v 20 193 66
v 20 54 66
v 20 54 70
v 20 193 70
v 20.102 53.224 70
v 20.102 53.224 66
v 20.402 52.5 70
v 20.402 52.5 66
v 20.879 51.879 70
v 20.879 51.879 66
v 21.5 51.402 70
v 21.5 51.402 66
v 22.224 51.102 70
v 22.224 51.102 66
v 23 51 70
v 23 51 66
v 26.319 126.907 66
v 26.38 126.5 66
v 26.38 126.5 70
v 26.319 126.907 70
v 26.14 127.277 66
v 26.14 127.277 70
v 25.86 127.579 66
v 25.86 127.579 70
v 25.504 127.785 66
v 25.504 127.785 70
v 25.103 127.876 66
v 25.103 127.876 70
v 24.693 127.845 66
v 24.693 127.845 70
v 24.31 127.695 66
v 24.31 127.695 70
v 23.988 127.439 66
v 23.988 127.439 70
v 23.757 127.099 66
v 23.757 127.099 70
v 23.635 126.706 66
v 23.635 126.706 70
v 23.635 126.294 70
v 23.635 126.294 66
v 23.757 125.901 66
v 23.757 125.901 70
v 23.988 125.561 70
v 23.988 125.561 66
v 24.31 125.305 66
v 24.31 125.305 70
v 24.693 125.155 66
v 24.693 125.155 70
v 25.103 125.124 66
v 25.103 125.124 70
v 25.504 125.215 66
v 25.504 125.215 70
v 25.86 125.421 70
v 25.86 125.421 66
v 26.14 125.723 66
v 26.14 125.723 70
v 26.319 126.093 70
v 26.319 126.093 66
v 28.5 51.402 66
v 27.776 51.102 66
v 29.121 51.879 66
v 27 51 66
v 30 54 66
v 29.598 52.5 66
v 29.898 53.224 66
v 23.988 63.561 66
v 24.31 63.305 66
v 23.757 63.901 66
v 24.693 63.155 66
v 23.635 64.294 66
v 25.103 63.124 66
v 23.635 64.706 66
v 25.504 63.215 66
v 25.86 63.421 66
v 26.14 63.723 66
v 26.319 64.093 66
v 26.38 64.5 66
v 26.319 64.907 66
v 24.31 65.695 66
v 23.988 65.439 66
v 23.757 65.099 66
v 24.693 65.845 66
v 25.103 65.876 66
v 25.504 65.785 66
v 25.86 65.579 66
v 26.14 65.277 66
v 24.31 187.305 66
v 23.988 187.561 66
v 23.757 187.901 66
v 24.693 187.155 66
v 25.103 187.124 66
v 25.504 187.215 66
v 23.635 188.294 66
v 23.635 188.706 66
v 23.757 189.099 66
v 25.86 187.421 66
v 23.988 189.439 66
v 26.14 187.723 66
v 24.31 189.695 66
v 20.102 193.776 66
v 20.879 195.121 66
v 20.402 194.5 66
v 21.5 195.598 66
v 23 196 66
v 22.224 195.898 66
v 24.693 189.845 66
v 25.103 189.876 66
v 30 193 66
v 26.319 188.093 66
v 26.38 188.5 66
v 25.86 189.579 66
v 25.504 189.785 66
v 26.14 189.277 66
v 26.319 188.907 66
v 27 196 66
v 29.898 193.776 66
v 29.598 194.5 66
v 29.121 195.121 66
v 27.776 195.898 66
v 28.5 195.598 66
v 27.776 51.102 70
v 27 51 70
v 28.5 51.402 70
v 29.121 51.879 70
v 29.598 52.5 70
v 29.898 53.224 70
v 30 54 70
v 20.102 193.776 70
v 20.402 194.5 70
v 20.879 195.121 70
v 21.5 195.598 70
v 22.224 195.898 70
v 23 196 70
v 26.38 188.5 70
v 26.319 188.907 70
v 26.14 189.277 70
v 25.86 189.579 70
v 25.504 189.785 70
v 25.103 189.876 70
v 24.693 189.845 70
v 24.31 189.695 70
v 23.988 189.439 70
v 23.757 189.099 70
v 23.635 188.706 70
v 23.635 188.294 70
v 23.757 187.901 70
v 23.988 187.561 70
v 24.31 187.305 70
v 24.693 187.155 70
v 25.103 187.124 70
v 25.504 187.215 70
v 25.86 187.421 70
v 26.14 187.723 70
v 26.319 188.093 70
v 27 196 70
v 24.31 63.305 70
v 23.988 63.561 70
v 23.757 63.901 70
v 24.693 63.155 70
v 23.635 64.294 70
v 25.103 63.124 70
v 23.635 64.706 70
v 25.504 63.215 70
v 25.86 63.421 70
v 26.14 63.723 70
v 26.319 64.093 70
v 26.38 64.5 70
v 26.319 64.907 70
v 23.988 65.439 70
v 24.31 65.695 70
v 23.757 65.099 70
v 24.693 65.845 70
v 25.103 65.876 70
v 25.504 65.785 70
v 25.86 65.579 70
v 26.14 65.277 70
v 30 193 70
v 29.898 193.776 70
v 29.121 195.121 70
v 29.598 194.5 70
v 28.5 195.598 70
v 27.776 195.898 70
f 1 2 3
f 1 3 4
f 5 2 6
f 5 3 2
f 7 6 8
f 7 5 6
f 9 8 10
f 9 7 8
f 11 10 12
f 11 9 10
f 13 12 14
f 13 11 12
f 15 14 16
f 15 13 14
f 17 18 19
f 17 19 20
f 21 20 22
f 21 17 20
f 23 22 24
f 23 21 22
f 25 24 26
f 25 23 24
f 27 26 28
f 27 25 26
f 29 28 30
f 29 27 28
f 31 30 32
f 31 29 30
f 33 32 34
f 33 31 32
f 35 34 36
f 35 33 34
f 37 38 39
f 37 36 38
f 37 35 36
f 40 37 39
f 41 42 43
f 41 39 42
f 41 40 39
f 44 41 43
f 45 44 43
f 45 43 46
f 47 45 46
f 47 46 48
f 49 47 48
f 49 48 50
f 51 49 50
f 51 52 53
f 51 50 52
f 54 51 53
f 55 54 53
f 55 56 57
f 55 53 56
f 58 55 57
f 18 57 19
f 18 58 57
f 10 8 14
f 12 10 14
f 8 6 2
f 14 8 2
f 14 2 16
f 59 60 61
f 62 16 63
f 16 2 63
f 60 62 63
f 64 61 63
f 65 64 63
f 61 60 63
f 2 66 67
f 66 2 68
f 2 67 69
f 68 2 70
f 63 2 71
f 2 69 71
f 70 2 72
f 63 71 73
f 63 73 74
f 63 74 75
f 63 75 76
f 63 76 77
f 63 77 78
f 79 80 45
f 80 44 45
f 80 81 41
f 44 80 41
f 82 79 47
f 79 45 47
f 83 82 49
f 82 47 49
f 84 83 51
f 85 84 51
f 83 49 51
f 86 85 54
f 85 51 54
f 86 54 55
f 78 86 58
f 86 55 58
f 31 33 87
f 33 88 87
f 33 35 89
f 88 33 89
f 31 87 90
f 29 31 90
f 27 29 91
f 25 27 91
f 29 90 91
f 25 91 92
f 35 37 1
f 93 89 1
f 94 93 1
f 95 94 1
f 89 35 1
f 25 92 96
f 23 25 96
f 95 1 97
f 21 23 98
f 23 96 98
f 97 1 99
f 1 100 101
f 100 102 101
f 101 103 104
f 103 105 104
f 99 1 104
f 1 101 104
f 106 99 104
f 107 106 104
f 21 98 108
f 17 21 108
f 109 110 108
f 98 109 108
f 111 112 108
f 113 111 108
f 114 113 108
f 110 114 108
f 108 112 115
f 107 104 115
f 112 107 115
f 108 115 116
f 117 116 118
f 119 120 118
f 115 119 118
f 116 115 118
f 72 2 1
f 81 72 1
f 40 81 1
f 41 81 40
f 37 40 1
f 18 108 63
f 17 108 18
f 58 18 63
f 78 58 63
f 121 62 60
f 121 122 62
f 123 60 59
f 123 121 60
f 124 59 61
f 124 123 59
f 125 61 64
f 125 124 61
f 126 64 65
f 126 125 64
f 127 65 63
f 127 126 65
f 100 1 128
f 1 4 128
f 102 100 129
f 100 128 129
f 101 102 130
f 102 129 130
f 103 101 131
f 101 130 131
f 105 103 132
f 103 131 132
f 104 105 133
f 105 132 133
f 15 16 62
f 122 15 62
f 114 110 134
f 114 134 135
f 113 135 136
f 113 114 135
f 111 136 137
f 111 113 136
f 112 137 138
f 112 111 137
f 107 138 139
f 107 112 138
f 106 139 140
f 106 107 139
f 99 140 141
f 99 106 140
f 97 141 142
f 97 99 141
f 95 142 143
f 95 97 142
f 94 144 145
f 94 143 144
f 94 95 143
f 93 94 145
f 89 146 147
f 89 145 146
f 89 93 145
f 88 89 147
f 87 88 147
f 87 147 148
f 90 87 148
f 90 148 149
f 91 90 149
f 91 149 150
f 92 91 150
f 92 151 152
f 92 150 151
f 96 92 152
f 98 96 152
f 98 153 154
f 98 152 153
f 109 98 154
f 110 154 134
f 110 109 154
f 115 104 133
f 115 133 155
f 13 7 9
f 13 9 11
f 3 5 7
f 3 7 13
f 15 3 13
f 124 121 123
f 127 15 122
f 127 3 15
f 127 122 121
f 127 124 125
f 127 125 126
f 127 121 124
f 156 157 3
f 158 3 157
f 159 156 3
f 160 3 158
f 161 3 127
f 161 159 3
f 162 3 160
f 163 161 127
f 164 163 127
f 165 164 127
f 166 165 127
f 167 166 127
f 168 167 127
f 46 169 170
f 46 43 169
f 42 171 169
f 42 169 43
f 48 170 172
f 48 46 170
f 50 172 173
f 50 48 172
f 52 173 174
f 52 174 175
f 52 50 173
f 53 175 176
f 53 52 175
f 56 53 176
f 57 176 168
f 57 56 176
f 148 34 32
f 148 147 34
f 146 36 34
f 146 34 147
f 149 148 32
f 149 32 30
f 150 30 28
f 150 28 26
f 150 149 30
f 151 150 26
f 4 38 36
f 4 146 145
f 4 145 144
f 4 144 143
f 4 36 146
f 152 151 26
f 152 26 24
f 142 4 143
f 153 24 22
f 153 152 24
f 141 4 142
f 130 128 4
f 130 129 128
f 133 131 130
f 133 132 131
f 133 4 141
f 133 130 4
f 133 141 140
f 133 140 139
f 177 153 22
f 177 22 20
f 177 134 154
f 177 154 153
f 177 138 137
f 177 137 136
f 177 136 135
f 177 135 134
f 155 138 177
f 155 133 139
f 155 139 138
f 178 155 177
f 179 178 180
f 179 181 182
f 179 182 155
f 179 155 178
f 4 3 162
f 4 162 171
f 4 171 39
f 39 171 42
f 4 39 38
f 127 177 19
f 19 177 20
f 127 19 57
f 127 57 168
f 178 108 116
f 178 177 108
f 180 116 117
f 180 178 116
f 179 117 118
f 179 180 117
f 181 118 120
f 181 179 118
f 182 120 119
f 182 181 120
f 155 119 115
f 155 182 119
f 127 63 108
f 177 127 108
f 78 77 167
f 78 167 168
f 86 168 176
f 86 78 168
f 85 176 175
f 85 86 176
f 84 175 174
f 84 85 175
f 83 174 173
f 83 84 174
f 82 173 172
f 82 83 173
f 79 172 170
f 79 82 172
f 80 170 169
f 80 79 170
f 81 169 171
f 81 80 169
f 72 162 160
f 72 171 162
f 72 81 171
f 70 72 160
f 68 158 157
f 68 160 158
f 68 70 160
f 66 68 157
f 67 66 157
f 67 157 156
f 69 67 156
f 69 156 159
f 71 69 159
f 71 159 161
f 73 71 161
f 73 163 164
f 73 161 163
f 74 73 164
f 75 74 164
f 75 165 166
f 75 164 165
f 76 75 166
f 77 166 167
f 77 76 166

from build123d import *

# Parameters (mm, degrees)
CYLINDER077_R     = 1.38
CYLINDER077_DEPTH = 13
CYLINDER076_R     = 1.38
CYLINDER076_DEPTH = 13
CYLINDER075_R     = 1.38
CYLINDER075_DEPTH = 13
BOX042_W          = 10
BOX042_H          = 145
BOX042_DEPTH      = 4
FILLET009_R       = 3


with BuildPart() as cylinder077:
    # Cylinder077 → Cylinder077 (new body)
    with BuildSketch(Plane(origin=(25, 188.5, 59), x_dir=(1, 0, 0), z_dir=(0, 0, 1))):
        Circle(CYLINDER077_R)
    extrude(amount=CYLINDER077_DEPTH)


with BuildPart() as cylinder076:
    # Cylinder076 → Cylinder076 (new body)
    with BuildSketch(Plane(origin=(25, 126.5, 59), x_dir=(1, 0, 0), z_dir=(0, 0, 1))):
        Circle(CYLINDER076_R)
    extrude(amount=CYLINDER076_DEPTH)


with BuildPart() as cylinder075:
    # Cylinder075 → Cylinder075 (new body)
    with BuildSketch(Plane(origin=(25, 64.5, 59), x_dir=(1, 0, 0), z_dir=(0, 0, 1))):
        Circle(CYLINDER075_R)
    extrude(amount=CYLINDER075_DEPTH)


with BuildPart() as uni_n_palancas_final_pos:
    # Box042 → Box042 (new body)
    with BuildSketch(Plane(origin=(20, 51, 66), x_dir=(1, 0, 0), z_dir=(0, 0, 1))):
        with Locations((5, 72.5)):
            Rectangle(BOX042_W, BOX042_H)
    extrude(amount=BOX042_DEPTH)

    # Fillet009
    fillet009_edges = [uni_n_palancas_final_pos.edges().sort_by_distance(p)[0] for p in [
        (20, 51, 68),
        (20, 196, 68),
        (30, 51, 68),
        (30, 196, 68),
    ]]
    fillet(fillet009_edges, radius=FILLET009_R)

    # Cut050: cut Cylinder075
    add(cylinder075.part, mode=Mode.SUBTRACT)

    # Cut051: cut Cylinder076
    add(cylinder076.part, mode=Mode.SUBTRACT)

    # Cut052: cut Cylinder077
    add(cylinder077.part, mode=Mode.SUBTRACT)


solid = uni_n_palancas_final_pos.part
